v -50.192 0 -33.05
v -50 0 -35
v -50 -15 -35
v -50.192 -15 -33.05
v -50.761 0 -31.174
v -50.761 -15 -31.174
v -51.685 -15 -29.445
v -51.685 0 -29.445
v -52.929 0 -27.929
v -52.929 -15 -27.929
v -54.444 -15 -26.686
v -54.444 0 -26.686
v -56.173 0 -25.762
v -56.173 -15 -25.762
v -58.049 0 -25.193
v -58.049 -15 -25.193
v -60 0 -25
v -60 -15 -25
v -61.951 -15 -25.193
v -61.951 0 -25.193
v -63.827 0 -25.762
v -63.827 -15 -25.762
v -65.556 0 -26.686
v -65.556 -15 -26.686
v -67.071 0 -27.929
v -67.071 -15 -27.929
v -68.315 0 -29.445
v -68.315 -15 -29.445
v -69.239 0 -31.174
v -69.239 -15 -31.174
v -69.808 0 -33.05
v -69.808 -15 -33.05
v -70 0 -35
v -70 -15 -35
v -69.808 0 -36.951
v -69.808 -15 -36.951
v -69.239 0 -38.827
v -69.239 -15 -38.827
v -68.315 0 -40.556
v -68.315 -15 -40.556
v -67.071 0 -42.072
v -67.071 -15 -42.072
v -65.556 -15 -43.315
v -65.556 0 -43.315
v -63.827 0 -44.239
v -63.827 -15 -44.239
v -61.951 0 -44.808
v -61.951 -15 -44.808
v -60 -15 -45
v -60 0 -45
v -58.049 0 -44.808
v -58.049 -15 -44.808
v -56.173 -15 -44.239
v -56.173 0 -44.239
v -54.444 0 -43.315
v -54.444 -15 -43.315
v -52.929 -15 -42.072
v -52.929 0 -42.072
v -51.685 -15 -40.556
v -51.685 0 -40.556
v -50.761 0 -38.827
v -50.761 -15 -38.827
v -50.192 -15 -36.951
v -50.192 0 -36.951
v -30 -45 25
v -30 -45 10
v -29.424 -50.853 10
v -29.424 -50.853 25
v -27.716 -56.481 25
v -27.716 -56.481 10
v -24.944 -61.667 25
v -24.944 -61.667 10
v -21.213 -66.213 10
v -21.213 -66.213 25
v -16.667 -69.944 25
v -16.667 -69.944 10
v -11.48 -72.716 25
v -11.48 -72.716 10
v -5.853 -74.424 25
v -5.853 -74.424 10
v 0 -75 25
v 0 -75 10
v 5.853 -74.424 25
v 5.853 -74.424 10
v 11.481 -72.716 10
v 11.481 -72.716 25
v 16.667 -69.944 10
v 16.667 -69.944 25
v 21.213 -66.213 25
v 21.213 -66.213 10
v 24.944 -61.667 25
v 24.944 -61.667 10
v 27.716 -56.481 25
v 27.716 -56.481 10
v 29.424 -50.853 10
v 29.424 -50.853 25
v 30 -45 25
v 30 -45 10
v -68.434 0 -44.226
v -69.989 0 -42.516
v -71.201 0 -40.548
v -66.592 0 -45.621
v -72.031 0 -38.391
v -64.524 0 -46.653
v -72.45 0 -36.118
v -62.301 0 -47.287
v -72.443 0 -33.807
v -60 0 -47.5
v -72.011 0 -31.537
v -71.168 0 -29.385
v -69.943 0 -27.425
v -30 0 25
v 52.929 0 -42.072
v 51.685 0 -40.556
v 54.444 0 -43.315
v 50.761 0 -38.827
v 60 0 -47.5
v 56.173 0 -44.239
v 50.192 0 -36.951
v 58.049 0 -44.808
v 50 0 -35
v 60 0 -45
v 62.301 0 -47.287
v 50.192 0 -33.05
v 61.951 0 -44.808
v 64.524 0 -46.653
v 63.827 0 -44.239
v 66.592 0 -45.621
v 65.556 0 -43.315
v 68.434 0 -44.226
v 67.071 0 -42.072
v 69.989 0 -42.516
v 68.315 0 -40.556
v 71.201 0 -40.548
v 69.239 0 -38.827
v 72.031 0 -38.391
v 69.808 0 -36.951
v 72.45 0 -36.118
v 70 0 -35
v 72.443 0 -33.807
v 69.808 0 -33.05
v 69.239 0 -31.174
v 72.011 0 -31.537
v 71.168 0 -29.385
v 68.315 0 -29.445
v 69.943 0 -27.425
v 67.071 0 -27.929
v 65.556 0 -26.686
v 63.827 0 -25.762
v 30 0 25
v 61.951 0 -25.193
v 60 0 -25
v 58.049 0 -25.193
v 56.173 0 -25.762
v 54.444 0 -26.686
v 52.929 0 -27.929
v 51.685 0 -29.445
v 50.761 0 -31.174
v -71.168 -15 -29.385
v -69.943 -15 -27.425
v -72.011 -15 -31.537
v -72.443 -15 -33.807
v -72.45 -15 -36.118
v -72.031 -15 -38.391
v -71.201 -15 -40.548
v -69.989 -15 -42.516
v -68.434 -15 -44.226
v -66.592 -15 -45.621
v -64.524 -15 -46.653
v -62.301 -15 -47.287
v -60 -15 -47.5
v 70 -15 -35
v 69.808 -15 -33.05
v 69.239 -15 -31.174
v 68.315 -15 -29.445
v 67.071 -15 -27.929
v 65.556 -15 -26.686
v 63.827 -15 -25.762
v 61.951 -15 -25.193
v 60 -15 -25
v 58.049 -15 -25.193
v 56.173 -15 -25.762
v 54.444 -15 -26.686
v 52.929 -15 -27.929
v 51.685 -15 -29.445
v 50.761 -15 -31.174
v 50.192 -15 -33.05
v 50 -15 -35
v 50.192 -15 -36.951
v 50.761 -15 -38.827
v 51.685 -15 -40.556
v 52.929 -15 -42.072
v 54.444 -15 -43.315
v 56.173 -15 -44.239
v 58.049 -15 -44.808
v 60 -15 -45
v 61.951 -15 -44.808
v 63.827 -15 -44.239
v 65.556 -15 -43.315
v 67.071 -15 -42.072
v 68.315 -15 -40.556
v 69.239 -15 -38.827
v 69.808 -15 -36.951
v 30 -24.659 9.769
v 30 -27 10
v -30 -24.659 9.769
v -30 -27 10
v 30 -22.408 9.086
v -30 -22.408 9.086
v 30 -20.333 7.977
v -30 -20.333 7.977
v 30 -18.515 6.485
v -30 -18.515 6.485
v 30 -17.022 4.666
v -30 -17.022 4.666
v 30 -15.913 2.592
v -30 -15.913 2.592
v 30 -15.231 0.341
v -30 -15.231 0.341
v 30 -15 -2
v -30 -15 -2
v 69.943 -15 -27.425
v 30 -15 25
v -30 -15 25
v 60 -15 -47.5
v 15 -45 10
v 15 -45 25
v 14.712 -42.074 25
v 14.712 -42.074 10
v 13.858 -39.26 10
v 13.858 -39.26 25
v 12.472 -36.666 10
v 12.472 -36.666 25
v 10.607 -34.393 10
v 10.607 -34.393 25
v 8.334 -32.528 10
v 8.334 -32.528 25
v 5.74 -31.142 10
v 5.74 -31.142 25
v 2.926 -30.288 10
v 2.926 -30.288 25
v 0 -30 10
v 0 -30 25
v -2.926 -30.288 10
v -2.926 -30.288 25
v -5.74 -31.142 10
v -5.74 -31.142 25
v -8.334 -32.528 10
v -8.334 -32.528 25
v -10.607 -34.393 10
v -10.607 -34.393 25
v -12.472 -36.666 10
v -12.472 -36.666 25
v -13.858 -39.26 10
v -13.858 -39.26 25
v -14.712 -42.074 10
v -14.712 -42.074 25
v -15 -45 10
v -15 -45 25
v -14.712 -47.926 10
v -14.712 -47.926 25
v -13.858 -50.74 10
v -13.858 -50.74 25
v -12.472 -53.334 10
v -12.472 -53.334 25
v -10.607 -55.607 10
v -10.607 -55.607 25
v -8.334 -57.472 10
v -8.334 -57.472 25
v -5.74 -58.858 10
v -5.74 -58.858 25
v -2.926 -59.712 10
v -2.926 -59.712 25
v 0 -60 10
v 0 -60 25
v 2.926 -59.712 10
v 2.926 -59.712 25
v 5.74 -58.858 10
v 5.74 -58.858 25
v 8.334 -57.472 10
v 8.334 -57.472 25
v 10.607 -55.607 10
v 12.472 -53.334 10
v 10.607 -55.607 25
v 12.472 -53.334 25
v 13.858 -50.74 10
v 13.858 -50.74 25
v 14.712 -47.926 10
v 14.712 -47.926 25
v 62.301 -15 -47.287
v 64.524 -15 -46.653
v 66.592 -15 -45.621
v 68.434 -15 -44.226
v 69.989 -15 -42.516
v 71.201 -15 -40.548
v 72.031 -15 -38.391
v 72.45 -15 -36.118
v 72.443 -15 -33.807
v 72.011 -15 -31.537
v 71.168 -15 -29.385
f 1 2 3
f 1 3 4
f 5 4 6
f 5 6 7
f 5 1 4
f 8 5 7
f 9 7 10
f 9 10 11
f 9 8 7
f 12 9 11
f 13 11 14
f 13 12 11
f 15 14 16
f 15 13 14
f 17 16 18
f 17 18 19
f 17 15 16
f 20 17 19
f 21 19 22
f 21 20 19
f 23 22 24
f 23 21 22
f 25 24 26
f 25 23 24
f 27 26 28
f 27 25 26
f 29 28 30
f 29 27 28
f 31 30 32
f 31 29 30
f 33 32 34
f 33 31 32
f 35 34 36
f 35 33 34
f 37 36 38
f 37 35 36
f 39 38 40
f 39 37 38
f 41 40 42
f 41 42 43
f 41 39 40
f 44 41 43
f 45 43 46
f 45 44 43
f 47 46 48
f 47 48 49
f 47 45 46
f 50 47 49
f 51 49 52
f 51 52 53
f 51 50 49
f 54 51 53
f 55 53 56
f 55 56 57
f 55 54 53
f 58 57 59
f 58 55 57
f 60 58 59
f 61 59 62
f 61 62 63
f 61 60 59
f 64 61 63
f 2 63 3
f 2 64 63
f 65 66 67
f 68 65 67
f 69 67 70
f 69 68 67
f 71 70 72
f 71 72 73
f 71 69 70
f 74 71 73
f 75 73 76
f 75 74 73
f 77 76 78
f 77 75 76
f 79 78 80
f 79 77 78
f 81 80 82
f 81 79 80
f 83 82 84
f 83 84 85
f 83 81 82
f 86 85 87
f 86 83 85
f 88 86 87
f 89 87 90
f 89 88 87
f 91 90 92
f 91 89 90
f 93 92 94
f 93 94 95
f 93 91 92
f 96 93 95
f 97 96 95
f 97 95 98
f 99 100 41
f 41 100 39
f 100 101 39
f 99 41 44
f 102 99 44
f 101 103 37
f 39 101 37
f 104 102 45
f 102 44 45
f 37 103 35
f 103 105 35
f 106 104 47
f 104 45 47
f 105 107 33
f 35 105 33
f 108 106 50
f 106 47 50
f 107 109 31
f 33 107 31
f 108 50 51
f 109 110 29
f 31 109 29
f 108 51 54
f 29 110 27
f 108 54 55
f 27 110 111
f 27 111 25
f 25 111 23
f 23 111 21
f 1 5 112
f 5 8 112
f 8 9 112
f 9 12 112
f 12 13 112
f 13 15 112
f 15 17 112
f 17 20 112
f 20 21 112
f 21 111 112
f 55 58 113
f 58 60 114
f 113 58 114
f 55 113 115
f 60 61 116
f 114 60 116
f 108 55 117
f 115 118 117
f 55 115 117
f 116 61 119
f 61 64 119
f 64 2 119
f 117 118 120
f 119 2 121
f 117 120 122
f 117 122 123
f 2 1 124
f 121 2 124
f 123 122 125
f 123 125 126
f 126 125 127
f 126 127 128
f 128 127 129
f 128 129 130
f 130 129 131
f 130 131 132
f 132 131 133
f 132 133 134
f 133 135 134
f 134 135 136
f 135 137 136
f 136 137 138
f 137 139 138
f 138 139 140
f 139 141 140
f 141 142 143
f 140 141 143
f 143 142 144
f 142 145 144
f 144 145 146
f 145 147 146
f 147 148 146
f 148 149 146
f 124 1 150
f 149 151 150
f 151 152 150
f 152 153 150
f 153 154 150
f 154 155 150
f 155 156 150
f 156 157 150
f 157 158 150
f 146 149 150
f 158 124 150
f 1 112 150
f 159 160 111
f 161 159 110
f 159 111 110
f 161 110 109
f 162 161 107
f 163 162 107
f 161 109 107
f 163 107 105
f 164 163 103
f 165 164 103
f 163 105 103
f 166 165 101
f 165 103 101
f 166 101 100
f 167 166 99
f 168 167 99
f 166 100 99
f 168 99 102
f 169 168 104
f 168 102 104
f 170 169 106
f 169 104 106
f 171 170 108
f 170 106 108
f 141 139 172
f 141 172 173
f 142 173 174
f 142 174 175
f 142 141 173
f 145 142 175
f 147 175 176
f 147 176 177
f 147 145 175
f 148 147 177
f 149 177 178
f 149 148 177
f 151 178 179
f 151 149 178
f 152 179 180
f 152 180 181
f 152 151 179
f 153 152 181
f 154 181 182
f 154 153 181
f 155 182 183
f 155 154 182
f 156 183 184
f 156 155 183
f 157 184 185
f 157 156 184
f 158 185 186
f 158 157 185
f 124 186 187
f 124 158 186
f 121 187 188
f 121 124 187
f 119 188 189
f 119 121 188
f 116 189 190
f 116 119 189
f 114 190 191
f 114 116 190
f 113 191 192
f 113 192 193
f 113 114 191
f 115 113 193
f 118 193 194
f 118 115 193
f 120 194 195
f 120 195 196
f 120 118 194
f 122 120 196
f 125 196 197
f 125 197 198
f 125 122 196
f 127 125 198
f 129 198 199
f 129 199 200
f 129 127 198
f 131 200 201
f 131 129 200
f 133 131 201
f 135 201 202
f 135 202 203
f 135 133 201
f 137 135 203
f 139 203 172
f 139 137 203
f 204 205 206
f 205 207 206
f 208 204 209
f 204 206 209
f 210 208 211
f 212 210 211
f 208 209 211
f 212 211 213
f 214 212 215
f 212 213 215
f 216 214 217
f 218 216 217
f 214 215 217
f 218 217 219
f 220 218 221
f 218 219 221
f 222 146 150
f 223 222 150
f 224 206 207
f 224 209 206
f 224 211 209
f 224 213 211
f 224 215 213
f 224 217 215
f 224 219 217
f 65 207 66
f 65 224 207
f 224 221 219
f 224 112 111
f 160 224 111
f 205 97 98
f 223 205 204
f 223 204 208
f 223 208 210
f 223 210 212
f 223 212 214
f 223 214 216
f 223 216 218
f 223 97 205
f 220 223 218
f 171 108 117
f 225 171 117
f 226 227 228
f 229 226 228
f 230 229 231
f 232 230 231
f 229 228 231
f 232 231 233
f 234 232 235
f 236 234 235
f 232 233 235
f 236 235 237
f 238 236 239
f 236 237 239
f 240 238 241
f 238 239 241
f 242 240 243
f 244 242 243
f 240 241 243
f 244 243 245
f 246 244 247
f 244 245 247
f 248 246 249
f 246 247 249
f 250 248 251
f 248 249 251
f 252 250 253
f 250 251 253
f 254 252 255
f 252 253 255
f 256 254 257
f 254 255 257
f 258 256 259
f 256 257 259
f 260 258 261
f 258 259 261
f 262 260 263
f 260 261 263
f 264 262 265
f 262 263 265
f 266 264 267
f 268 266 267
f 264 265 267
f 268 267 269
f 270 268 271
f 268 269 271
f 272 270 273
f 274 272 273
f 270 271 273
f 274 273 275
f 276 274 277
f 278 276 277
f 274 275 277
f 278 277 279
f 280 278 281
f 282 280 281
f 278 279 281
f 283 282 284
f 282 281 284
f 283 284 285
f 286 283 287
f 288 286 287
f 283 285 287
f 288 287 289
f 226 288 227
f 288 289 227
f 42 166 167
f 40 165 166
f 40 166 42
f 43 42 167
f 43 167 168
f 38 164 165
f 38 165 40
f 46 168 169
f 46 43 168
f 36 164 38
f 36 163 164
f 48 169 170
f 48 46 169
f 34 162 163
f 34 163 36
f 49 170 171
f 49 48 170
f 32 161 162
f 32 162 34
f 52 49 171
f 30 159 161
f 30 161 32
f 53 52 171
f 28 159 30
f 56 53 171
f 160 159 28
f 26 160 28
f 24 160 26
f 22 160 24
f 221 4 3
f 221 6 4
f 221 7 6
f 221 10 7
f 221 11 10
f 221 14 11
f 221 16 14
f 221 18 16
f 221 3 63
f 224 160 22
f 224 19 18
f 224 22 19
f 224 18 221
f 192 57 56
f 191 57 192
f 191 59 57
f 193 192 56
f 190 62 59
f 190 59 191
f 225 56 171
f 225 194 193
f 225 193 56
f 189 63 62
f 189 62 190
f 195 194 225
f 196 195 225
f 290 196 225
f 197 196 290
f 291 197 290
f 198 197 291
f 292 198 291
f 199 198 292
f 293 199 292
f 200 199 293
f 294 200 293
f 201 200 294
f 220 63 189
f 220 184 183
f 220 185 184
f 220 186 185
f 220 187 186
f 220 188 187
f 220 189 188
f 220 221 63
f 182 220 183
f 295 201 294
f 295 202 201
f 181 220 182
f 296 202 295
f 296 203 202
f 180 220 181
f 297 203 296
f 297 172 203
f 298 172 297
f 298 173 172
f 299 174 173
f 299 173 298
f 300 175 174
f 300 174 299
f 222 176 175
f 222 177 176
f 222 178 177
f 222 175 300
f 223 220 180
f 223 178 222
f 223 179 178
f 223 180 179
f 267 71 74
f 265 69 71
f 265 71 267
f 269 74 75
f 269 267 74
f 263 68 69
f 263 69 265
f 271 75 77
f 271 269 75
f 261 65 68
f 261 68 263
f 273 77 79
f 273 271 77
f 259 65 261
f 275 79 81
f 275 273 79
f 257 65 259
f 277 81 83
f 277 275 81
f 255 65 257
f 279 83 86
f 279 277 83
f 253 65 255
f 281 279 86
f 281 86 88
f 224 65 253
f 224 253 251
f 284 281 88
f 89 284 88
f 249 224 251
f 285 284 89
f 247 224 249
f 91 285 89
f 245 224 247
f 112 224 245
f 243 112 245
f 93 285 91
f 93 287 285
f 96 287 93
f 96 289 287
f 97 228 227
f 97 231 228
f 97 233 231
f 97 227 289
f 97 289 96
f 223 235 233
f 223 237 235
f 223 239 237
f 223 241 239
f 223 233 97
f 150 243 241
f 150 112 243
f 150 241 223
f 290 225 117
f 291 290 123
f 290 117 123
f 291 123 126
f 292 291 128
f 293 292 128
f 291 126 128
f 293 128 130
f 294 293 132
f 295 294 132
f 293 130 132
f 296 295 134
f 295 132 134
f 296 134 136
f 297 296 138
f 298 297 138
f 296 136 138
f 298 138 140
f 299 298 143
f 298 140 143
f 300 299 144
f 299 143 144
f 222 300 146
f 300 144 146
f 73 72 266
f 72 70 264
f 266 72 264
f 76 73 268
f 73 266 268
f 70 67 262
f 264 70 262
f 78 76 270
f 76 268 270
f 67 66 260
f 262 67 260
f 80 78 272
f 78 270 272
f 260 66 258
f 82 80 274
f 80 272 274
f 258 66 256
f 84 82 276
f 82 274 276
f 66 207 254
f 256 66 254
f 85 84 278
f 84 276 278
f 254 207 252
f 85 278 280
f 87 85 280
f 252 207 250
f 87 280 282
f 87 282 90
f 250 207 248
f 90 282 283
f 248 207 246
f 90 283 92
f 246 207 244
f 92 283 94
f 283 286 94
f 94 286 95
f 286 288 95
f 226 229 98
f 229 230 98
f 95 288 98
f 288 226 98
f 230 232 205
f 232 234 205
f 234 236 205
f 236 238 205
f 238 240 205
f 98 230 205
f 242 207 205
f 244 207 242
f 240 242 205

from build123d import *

# Parameters (mm, degrees)
F0_R     = 10
F1_DEPTH = 15
F3_R     = 15
F4_DEPTH = 15
F5_R     = 12


# Not quite as in the source:
# - ends of sketch curves that miss each other by under 0.0002 mm in the source are joined


with BuildPart() as f1:
    # F0 (on Front) → F1 (new body)
    with BuildSketch(Plane.XZ):
        with BuildLine():
            Line((-30, 24.9995148627), (-69.9428552721, -27.4248908346))
            ThreePointArc((-69.9428552721, -27.4248908346), (-71.2014492094, -40.5482356371), (-60, -47.5004851373))
            Line((-60, -47.5004851373), (60, -47.5004851373))
            ThreePointArc((60, -47.5004851373), (71.2014492094, -40.5482356371), (69.9428552721, -27.4248908346))
            Line((69.9428552721, -27.4248908346), (30, 24.9995148627))
            Line((30, 24.9995148627), (0, 24.9995148627))
            Line((0, 24.9995148627), (-30, 24.9995148627))
        make_face()
        with Locations((-60, -35.0004851373)):
            Circle(F0_R, mode=Mode.SUBTRACT)
        with Locations((60, -35.0004851373)):
            Circle(F0_R, mode=Mode.SUBTRACT)
    extrude(amount=F1_DEPTH)

    # F3 (on offset) → F4 (join)
    with BuildSketch(Plane.XY.offset(24.9995148627)):
        with BuildLine():
            Line((-30, -14.9999307469), (-30, -45.0000600332))
            ThreePointArc((-30, -45.0000600332), (2.21189e-05, -75), (30, -45.0000157953))
            Line((30, -45.0000157953), (30, -14.9999307469))
            Line((30, -14.9999307469), (30, 0))
            Line((30, 0), (-30, 0))
            Line((-30, 0), (-30, -14.9999307469))
        make_face()
        with Locations((0, -45)):
            Circle(F3_R, mode=Mode.SUBTRACT)
    extrude(amount=-F4_DEPTH)

    # F5
    f5_edges = [f1.edges().sort_by_distance(p)[0] for p in [
        (0, -15, 9.999515),
    ]]
    fillet(f5_edges, radius=F5_R)


solid = f1.part
